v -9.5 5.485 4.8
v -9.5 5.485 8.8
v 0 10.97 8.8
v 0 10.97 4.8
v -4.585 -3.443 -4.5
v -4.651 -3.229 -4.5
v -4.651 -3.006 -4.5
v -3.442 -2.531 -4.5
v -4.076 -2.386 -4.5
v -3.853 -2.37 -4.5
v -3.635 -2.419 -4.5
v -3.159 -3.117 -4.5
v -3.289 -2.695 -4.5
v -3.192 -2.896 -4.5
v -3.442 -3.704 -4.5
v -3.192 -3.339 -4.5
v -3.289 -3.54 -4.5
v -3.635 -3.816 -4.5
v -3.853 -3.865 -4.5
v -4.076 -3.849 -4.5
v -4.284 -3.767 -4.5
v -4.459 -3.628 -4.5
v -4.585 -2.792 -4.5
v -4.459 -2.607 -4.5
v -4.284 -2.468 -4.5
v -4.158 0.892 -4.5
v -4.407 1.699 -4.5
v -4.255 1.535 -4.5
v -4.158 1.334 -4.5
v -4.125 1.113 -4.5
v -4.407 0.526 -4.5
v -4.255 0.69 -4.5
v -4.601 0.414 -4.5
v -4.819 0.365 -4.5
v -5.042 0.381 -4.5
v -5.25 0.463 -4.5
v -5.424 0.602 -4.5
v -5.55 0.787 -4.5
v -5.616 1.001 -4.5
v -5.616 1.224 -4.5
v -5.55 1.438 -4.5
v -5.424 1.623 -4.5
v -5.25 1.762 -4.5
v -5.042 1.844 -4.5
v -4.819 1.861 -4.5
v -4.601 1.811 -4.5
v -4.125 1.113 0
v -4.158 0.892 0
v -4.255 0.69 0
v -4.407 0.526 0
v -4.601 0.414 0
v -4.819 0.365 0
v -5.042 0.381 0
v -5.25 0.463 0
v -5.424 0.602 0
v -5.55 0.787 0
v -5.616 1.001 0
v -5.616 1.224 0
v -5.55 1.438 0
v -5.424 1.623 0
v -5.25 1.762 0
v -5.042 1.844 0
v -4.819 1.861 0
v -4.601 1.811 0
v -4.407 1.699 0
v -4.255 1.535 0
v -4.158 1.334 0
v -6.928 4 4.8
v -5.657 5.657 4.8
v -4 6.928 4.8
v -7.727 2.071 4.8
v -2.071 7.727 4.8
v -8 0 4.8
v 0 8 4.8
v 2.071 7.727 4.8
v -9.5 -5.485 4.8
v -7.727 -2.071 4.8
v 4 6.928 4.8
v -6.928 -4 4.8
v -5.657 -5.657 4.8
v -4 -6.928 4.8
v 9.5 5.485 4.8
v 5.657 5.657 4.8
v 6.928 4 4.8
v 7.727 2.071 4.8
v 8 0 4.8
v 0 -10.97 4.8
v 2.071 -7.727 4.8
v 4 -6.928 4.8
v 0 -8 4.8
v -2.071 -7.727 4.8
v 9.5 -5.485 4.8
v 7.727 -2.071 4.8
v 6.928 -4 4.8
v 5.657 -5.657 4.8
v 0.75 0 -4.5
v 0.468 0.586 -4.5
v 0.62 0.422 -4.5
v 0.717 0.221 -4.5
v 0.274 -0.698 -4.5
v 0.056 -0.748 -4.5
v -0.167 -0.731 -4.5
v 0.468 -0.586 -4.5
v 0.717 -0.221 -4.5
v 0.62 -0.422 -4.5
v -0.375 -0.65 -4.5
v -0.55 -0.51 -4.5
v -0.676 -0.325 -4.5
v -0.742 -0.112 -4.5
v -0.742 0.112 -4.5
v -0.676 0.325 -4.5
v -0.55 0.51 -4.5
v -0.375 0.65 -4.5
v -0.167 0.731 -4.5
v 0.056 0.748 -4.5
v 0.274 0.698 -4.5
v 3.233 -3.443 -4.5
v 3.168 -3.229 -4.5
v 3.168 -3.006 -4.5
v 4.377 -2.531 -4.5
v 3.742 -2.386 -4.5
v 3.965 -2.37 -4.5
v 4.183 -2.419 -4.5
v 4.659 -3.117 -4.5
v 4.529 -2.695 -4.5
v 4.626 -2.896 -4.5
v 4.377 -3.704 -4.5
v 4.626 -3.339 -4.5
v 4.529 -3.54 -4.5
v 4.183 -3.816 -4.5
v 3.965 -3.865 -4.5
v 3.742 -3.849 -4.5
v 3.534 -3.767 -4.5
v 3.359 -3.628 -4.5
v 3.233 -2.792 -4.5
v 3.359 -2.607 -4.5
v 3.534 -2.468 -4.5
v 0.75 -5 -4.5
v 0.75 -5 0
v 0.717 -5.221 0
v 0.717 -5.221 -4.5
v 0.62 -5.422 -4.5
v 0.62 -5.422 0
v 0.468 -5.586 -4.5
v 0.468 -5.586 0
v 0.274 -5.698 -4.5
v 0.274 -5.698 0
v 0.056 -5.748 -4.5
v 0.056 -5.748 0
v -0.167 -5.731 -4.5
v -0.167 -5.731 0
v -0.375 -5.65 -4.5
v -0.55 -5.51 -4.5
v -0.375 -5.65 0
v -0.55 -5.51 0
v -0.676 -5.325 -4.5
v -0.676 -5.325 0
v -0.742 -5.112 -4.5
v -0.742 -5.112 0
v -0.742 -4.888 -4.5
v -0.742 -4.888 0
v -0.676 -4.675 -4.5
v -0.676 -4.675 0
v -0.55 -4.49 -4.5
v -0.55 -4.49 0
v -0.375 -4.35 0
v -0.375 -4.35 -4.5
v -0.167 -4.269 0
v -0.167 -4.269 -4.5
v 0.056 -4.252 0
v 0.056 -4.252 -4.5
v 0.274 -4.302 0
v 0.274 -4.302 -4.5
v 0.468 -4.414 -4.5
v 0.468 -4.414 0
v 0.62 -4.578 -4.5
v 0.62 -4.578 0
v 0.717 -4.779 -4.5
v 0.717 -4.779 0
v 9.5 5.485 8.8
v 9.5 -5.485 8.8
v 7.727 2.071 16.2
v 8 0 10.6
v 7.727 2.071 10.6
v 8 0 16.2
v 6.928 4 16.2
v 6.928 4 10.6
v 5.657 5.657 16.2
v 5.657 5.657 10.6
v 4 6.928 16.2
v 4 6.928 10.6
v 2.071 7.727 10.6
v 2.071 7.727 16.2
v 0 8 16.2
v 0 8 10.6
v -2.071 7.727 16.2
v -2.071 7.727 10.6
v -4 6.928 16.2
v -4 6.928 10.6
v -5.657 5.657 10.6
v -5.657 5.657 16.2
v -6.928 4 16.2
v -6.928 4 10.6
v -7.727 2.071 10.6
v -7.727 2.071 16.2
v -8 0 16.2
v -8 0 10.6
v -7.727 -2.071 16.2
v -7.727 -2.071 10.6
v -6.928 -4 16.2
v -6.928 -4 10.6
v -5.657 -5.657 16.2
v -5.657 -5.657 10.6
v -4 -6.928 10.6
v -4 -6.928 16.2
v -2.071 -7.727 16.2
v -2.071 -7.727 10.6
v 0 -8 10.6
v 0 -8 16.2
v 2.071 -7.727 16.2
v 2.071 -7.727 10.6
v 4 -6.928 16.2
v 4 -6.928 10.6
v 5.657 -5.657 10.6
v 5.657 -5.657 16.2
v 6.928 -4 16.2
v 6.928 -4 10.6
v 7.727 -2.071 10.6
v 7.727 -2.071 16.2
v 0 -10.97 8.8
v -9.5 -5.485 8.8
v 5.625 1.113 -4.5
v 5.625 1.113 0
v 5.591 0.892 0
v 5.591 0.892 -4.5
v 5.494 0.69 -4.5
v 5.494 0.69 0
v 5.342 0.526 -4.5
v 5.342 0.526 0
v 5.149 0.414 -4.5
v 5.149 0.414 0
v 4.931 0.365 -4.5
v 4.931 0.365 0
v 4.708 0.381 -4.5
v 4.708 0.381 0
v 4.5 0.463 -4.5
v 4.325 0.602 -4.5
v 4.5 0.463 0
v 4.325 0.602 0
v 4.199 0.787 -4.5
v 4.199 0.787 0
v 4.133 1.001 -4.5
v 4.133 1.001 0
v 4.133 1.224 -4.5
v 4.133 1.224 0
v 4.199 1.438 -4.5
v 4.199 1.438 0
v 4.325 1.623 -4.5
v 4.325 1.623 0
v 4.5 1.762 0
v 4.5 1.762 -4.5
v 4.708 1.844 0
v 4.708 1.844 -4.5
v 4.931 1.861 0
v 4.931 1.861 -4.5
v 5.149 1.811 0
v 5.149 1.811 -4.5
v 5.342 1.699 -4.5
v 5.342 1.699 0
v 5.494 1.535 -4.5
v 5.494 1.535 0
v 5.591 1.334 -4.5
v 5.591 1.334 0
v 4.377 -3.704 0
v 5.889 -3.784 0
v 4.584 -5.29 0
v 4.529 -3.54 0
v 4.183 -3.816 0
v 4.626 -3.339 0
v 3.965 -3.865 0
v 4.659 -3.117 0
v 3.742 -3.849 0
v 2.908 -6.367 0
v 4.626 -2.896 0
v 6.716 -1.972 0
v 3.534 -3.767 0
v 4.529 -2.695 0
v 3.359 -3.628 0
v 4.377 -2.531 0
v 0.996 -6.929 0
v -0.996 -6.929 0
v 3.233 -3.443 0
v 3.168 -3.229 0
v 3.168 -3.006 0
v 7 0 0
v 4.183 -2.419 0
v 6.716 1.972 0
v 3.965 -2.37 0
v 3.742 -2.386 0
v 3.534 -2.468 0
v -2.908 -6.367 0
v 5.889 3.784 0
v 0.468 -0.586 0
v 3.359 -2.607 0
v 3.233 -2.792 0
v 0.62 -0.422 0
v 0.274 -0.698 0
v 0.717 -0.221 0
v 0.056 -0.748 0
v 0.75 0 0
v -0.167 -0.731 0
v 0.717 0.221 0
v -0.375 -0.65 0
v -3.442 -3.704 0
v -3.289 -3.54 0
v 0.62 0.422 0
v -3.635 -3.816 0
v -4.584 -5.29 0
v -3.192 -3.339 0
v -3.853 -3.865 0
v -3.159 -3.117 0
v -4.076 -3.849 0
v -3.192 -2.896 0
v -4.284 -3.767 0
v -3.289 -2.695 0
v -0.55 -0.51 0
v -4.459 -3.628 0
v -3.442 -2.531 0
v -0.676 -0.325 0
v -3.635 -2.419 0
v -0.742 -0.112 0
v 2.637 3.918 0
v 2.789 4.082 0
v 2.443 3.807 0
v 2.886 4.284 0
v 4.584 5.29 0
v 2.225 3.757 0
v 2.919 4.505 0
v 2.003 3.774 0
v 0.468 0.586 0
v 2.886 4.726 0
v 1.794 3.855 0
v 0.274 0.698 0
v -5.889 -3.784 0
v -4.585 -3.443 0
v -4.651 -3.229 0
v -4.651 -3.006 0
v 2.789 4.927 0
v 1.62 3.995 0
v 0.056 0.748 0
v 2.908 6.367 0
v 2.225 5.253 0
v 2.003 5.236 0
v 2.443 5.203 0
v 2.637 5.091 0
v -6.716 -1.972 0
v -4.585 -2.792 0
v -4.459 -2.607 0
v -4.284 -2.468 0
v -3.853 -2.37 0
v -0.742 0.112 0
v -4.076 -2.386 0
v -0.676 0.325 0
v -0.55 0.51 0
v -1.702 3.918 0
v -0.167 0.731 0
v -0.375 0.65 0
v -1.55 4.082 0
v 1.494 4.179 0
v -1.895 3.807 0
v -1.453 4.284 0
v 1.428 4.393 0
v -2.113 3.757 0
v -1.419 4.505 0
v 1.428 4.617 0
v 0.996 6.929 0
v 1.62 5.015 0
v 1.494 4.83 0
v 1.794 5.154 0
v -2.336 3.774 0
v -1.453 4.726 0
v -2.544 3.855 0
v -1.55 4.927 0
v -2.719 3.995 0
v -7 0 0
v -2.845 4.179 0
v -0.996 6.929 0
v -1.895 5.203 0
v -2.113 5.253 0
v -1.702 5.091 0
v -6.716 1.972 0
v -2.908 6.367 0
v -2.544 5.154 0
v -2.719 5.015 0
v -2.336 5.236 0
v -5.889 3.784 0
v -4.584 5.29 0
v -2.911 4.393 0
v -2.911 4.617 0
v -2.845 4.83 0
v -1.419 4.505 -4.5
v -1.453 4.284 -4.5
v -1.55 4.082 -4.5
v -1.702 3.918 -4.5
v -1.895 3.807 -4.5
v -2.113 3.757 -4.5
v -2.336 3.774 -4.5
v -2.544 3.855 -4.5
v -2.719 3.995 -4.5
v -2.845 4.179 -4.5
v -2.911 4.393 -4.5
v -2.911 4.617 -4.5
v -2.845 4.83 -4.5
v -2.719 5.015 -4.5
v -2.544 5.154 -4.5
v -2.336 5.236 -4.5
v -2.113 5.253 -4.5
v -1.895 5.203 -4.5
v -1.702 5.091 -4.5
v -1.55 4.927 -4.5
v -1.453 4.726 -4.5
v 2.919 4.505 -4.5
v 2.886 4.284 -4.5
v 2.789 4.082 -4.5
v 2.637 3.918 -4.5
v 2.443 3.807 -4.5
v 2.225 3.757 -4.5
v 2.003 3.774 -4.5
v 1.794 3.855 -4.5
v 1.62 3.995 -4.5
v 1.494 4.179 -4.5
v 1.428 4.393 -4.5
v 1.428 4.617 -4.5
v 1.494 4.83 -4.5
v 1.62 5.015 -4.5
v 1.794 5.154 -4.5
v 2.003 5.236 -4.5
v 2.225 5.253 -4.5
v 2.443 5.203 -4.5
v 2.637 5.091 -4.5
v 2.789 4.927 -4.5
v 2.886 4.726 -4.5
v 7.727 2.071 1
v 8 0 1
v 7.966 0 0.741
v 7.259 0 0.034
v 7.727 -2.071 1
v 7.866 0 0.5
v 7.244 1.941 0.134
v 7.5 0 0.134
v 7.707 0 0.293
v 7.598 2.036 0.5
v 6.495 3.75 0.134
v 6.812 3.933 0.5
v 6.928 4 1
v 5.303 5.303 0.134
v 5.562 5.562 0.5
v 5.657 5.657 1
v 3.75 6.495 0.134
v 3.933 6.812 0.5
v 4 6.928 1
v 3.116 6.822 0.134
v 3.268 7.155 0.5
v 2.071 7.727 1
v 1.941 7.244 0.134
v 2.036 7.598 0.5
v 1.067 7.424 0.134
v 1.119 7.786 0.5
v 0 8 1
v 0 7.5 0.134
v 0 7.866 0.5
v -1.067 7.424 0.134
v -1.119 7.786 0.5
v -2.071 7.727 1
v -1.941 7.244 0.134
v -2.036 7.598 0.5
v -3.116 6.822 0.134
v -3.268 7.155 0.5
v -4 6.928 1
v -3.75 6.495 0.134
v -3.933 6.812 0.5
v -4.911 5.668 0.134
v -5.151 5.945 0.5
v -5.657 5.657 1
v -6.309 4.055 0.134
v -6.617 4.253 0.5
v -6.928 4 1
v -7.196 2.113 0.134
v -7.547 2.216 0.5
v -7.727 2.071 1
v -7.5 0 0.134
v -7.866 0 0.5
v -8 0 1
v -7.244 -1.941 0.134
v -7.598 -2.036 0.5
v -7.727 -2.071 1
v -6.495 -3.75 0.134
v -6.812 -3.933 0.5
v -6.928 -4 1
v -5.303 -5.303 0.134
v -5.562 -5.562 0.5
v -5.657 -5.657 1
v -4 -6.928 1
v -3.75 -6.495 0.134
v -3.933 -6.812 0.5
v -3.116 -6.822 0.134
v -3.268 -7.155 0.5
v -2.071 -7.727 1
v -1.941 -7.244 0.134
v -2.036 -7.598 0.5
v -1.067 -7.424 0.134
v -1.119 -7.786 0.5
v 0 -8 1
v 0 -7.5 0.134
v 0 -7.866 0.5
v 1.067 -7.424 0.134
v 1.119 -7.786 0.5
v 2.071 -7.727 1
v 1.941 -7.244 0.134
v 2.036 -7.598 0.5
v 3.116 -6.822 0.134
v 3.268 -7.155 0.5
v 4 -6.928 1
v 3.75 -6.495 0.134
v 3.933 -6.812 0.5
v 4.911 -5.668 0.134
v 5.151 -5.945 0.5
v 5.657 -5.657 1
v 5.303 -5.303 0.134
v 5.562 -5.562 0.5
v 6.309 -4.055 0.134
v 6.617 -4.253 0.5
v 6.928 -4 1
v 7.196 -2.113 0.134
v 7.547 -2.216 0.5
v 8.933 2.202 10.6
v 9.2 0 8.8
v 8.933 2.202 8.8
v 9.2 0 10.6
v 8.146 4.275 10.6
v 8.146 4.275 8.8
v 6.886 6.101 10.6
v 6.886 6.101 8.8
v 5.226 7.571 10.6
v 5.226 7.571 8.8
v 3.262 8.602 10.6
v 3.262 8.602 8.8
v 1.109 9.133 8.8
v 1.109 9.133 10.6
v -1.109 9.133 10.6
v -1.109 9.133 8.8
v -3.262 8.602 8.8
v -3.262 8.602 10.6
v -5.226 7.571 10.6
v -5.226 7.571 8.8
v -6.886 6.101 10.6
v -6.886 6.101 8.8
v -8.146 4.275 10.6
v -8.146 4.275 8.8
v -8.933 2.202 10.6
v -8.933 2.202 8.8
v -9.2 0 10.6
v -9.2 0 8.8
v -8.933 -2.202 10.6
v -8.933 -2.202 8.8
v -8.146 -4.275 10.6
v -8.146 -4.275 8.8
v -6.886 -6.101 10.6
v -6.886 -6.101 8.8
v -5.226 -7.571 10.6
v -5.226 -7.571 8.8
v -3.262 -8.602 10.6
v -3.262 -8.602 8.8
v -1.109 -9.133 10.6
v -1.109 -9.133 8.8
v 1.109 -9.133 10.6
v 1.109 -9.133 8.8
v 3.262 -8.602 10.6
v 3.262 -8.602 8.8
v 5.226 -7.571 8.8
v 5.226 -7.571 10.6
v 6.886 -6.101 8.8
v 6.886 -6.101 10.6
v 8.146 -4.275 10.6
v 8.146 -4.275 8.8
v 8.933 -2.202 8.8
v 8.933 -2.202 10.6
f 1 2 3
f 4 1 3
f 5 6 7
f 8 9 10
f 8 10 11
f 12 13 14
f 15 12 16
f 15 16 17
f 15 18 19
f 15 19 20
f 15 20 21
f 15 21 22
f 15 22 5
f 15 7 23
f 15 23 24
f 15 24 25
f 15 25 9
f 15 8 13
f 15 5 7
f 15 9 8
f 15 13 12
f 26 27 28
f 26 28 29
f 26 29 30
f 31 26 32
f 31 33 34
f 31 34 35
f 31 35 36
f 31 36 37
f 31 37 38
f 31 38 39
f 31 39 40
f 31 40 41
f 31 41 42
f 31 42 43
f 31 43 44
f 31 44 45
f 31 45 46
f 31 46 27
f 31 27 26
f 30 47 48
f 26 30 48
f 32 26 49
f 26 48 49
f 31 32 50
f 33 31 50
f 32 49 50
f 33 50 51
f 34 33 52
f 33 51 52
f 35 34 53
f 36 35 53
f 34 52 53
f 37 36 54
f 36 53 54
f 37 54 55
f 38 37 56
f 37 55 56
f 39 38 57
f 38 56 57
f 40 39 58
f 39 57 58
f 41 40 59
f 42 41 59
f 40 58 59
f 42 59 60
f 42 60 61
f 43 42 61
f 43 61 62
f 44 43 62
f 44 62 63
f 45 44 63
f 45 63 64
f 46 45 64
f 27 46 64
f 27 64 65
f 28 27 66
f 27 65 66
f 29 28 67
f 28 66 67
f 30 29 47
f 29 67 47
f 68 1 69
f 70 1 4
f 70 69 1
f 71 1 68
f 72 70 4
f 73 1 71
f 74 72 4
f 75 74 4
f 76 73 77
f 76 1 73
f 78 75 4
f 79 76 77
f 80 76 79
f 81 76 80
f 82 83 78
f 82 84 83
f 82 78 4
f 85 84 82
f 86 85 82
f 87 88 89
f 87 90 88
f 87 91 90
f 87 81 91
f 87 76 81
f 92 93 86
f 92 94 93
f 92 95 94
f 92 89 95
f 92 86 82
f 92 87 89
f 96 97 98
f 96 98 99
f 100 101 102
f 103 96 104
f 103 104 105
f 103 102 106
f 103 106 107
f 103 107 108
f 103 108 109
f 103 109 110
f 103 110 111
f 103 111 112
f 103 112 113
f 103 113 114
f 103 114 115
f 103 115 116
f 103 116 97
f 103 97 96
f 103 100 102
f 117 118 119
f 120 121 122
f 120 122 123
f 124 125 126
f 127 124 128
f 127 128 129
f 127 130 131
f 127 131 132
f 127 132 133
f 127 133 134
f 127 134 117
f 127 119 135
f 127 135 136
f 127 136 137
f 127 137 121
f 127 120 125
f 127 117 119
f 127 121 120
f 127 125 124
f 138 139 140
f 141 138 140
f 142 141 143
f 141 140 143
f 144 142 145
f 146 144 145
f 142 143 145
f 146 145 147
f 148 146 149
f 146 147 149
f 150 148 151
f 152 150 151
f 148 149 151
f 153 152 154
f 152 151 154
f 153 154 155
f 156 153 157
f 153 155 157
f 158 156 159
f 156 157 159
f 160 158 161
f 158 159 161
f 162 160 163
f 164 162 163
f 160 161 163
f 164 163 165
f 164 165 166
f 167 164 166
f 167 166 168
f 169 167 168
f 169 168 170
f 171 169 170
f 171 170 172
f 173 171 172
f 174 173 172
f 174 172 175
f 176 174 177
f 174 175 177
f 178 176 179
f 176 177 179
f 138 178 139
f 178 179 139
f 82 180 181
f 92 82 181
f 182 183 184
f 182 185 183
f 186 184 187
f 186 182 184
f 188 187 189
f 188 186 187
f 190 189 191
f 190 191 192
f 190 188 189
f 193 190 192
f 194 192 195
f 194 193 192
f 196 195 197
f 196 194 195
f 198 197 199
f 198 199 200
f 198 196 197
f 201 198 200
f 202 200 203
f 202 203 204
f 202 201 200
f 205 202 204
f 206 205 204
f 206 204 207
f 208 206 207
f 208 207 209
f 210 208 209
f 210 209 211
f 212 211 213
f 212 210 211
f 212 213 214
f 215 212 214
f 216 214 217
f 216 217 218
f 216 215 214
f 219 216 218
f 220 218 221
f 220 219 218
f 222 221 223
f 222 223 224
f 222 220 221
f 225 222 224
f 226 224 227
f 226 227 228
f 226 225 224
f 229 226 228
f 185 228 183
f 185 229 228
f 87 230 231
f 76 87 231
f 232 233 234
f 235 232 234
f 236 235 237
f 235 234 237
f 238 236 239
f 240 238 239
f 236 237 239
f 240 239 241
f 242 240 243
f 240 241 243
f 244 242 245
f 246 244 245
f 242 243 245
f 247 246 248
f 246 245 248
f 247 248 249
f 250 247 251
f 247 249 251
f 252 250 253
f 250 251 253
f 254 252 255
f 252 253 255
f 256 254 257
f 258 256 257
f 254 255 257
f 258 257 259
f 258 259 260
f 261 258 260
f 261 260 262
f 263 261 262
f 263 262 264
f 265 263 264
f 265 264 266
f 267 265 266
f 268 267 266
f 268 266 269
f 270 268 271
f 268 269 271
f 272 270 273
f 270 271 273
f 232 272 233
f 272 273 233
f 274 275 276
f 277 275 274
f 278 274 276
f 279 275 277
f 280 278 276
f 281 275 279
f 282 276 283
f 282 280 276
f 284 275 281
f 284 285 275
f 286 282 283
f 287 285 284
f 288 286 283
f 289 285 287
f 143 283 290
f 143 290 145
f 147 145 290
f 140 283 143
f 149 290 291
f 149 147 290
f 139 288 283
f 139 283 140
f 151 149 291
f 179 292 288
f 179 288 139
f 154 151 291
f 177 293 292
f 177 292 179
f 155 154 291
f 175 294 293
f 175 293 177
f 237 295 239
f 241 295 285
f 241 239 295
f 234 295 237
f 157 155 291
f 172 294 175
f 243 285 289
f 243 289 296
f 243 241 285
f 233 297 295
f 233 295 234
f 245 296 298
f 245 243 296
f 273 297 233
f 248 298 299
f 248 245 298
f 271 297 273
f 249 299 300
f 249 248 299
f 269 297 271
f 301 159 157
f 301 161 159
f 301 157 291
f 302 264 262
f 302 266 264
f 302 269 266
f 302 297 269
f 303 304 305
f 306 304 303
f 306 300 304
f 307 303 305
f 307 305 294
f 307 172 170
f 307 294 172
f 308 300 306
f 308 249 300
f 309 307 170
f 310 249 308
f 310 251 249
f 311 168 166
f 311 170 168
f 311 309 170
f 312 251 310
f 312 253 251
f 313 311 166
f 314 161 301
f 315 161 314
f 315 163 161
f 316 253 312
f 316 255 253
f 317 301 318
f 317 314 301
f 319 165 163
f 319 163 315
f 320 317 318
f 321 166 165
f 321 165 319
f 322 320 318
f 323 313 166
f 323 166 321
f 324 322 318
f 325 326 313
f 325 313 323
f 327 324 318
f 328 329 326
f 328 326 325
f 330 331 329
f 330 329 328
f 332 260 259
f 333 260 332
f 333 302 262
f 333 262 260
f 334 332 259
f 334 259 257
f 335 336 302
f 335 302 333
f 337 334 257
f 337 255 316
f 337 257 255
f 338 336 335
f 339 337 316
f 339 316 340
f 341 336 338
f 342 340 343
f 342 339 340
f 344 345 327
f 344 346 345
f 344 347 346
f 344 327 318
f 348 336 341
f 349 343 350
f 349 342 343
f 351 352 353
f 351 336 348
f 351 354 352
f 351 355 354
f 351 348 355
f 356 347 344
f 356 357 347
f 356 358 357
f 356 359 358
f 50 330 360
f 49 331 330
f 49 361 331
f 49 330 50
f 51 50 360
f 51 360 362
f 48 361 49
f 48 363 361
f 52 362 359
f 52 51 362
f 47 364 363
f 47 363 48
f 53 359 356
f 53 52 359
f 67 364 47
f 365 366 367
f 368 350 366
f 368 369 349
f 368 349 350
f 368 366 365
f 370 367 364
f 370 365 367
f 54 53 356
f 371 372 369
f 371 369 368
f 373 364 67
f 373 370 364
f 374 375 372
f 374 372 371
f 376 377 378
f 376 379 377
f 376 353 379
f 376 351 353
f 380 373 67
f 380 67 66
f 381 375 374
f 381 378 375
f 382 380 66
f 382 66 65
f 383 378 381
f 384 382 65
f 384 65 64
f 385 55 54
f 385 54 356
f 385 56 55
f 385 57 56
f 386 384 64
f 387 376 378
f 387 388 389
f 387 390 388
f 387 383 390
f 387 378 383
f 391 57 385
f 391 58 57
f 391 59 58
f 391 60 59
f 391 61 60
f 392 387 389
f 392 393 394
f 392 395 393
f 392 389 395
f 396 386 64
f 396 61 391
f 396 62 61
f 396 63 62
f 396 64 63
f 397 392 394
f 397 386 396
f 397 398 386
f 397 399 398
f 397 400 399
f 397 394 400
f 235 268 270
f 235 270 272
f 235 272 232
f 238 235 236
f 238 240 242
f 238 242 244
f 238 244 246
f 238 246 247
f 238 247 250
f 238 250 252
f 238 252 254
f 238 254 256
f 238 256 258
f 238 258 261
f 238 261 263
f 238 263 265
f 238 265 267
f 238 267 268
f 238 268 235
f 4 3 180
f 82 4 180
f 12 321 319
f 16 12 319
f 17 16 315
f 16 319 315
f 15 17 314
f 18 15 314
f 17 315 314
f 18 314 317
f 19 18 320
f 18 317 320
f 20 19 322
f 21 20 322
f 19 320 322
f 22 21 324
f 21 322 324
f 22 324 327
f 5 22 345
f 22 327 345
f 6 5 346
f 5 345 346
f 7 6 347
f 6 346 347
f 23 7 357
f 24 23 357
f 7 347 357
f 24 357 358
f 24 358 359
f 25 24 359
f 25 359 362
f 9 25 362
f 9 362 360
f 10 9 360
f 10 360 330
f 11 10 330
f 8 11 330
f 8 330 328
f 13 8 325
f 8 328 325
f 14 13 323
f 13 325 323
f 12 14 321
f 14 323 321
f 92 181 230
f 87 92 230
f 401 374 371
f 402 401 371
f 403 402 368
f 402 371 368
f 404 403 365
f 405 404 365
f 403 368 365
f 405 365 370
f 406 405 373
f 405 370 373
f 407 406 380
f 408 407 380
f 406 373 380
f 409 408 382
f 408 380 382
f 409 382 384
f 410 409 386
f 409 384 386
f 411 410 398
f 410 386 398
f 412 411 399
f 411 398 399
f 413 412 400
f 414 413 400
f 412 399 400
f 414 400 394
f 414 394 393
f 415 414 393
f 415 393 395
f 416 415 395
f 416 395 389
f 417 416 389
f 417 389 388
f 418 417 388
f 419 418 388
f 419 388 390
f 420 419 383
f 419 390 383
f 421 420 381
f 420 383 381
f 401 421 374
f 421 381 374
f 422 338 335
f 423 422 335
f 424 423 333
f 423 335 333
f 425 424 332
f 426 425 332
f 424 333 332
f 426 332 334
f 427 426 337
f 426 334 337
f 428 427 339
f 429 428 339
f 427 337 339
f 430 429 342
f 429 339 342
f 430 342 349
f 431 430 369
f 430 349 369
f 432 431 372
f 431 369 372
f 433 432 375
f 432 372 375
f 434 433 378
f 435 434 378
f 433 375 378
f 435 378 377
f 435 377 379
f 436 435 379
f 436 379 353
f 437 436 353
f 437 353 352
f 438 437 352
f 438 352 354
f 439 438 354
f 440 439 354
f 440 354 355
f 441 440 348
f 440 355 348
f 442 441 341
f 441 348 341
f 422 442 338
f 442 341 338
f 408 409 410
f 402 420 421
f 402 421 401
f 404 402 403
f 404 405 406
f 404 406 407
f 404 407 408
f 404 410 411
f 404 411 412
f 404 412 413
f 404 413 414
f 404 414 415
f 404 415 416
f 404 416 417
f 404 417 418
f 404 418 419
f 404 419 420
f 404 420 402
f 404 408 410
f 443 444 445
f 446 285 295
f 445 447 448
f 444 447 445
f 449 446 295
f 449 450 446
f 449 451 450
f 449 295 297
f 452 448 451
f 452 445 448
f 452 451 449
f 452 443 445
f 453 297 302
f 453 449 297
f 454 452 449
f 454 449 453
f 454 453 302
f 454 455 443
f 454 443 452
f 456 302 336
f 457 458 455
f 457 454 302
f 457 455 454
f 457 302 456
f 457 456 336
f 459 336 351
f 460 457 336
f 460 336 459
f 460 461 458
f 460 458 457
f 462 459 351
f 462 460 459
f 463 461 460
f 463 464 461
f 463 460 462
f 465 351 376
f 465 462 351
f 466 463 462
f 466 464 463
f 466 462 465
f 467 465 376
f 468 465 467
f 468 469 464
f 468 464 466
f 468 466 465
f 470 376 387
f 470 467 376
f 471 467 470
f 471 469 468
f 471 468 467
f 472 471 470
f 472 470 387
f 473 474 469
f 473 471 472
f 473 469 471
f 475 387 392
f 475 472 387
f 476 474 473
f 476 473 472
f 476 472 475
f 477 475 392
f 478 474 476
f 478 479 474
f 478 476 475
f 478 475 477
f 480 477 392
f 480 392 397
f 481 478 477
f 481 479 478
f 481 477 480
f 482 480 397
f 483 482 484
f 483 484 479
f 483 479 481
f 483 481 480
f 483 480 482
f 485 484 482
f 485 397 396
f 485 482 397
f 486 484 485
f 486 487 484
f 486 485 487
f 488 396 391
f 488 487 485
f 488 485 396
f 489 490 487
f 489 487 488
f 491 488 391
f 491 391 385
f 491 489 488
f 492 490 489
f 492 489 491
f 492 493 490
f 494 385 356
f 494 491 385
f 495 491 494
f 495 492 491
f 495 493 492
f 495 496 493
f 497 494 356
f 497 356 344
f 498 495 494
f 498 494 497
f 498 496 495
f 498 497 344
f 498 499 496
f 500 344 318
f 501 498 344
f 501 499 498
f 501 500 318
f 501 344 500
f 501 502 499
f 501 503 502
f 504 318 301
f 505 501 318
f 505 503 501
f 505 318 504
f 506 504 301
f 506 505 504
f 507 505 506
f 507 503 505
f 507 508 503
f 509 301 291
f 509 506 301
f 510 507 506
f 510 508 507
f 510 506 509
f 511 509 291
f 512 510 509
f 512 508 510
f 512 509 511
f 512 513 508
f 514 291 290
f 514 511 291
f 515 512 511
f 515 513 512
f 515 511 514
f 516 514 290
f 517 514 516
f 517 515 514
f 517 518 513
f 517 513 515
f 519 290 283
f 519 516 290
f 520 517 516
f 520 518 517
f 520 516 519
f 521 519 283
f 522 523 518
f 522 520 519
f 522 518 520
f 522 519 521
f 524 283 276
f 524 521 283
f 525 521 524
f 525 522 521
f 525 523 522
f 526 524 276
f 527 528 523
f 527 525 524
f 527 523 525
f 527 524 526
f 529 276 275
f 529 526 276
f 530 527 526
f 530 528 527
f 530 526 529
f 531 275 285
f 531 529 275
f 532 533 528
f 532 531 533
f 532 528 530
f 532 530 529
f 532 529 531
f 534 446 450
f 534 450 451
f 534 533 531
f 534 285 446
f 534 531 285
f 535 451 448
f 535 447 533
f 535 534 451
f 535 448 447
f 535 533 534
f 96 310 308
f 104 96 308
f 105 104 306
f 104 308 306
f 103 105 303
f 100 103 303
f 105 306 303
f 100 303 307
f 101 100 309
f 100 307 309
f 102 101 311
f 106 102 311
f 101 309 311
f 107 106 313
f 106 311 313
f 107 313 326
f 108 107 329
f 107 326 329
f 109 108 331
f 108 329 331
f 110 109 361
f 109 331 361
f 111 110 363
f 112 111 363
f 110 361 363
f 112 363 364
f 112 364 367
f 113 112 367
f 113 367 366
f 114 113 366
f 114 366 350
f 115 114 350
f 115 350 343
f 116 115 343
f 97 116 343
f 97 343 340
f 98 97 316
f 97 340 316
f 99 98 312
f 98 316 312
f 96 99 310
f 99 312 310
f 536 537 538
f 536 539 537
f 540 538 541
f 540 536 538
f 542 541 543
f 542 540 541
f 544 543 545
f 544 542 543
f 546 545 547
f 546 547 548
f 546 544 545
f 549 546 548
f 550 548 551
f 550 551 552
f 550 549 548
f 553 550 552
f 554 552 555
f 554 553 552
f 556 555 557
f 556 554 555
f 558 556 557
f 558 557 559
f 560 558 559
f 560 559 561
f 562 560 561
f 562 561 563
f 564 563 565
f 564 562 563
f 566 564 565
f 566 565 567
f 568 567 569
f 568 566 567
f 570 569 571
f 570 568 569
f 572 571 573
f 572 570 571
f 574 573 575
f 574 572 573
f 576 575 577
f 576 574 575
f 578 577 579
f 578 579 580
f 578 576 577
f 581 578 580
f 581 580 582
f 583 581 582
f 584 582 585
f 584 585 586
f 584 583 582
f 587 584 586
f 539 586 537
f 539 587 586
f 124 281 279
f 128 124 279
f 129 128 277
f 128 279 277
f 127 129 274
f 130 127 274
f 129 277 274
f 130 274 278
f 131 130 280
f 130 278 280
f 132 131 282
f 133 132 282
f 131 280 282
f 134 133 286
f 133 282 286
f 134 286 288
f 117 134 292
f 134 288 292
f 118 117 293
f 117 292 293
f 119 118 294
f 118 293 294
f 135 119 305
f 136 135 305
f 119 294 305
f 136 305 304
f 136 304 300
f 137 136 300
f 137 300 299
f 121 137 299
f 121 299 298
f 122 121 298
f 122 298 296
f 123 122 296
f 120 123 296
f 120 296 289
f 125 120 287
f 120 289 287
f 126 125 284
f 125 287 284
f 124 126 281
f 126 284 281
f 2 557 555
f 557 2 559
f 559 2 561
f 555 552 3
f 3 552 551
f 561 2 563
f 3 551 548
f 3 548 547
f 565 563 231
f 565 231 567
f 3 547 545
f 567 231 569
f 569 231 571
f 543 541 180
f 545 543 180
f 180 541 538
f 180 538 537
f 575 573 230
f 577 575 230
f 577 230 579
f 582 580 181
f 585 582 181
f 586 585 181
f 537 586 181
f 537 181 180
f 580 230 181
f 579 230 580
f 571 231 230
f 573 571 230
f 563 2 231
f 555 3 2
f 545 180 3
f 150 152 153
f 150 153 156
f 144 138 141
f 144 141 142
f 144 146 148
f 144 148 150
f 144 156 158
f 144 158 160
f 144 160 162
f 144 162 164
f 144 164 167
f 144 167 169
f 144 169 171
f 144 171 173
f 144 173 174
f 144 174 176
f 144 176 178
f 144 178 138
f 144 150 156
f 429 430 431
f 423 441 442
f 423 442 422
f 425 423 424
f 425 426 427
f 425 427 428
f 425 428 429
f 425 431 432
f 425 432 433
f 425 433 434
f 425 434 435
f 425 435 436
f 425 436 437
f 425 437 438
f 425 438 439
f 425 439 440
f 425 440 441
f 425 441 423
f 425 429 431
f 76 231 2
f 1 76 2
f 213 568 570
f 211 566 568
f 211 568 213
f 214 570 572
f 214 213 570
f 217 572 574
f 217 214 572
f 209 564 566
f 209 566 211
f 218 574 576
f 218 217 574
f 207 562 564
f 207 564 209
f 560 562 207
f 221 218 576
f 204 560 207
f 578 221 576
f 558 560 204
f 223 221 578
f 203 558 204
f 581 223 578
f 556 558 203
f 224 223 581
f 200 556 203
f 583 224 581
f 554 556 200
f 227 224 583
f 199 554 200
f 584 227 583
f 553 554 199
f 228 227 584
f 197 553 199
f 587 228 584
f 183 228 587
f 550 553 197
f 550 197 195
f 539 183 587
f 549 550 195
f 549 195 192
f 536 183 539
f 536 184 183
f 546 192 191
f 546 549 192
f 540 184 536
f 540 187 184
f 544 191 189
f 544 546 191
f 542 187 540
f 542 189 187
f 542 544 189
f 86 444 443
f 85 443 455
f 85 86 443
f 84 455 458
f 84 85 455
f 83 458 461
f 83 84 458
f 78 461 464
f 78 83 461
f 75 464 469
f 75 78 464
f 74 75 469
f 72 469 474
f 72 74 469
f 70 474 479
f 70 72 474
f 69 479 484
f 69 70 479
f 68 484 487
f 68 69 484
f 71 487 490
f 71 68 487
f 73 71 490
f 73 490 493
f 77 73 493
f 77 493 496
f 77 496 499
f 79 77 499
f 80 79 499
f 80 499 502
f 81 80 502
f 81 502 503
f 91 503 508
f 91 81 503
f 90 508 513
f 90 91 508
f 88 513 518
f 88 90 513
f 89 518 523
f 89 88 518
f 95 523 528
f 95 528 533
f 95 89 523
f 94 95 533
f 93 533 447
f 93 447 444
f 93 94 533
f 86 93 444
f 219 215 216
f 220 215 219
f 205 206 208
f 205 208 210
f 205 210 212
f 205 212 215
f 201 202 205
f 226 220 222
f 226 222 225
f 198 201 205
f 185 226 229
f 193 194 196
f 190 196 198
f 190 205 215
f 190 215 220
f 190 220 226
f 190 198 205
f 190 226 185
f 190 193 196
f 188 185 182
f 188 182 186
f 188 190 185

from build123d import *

# Parameters (mm, degrees)
F2_R     = 1
F3_R     = 0.75
F4_DEPTH = 4.5
F5_R     = 9.2
F5_R_2   = 8
F6_DEPTH = 4


with BuildPart() as f1:
    # F0 (on Front) → F1 (revolve)
    with BuildSketch(Plane.XZ):
        Polygon((0, 16.2), (0, 0), (8, 0), (8, 8.8), (9.2, 8.8), (9.2, 10.6), (8, 10.6), (8, 16.2), align=None)
    revolve(axis=Axis((0, 0, 8.1), (0, 0, 1)))

    # F2
    f2_edges = [f1.edges().sort_by_distance(p)[0] for p in [
        (-8, 0, 0),
    ]]
    fillet(f2_edges, radius=F2_R)

    # F3 (on face) → F4 (join)
    with BuildSketch(Plane(origin=(0, 0, 0), x_dir=(1, 0, 0), z_dir=(0, 0, -1))):
        Circle(F3_R)
        with Locations((0, 5)):
            Circle(F3_R)
        with Locations((-3.909157, 3.117449)):
            Circle(F3_R)
        with Locations((-4.87464, -1.112605)):
            Circle(F3_R)
        with Locations((-2.169419, -4.504844)):
            Circle(F3_R)
        with Locations((2.169419, -4.504844)):
            Circle(F3_R)
        with Locations((4.87464, -1.112605)):
            Circle(F3_R)
        with Locations((3.909157, 3.117449)):
            Circle(F3_R)
    extrude(amount=F4_DEPTH)

    # F5 (on face) → F6 (join)
    with BuildSketch(Plane(origin=(0, 0, 8.8), x_dir=(1, 0, 0), z_dir=(0, 0, -1))):
        Polygon((9.5, -5.484828), (9.5, 5.484828), (0, 10.969655), (-9.5, 5.484828), (-9.5, -5.484828), (0, -10.969655), align=None)
        Circle(F5_R, mode=Mode.SUBTRACT)
        Circle(F5_R)
        Circle(F5_R_2, mode=Mode.SUBTRACT)
    extrude(amount=F6_DEPTH)


solid = f1.part
